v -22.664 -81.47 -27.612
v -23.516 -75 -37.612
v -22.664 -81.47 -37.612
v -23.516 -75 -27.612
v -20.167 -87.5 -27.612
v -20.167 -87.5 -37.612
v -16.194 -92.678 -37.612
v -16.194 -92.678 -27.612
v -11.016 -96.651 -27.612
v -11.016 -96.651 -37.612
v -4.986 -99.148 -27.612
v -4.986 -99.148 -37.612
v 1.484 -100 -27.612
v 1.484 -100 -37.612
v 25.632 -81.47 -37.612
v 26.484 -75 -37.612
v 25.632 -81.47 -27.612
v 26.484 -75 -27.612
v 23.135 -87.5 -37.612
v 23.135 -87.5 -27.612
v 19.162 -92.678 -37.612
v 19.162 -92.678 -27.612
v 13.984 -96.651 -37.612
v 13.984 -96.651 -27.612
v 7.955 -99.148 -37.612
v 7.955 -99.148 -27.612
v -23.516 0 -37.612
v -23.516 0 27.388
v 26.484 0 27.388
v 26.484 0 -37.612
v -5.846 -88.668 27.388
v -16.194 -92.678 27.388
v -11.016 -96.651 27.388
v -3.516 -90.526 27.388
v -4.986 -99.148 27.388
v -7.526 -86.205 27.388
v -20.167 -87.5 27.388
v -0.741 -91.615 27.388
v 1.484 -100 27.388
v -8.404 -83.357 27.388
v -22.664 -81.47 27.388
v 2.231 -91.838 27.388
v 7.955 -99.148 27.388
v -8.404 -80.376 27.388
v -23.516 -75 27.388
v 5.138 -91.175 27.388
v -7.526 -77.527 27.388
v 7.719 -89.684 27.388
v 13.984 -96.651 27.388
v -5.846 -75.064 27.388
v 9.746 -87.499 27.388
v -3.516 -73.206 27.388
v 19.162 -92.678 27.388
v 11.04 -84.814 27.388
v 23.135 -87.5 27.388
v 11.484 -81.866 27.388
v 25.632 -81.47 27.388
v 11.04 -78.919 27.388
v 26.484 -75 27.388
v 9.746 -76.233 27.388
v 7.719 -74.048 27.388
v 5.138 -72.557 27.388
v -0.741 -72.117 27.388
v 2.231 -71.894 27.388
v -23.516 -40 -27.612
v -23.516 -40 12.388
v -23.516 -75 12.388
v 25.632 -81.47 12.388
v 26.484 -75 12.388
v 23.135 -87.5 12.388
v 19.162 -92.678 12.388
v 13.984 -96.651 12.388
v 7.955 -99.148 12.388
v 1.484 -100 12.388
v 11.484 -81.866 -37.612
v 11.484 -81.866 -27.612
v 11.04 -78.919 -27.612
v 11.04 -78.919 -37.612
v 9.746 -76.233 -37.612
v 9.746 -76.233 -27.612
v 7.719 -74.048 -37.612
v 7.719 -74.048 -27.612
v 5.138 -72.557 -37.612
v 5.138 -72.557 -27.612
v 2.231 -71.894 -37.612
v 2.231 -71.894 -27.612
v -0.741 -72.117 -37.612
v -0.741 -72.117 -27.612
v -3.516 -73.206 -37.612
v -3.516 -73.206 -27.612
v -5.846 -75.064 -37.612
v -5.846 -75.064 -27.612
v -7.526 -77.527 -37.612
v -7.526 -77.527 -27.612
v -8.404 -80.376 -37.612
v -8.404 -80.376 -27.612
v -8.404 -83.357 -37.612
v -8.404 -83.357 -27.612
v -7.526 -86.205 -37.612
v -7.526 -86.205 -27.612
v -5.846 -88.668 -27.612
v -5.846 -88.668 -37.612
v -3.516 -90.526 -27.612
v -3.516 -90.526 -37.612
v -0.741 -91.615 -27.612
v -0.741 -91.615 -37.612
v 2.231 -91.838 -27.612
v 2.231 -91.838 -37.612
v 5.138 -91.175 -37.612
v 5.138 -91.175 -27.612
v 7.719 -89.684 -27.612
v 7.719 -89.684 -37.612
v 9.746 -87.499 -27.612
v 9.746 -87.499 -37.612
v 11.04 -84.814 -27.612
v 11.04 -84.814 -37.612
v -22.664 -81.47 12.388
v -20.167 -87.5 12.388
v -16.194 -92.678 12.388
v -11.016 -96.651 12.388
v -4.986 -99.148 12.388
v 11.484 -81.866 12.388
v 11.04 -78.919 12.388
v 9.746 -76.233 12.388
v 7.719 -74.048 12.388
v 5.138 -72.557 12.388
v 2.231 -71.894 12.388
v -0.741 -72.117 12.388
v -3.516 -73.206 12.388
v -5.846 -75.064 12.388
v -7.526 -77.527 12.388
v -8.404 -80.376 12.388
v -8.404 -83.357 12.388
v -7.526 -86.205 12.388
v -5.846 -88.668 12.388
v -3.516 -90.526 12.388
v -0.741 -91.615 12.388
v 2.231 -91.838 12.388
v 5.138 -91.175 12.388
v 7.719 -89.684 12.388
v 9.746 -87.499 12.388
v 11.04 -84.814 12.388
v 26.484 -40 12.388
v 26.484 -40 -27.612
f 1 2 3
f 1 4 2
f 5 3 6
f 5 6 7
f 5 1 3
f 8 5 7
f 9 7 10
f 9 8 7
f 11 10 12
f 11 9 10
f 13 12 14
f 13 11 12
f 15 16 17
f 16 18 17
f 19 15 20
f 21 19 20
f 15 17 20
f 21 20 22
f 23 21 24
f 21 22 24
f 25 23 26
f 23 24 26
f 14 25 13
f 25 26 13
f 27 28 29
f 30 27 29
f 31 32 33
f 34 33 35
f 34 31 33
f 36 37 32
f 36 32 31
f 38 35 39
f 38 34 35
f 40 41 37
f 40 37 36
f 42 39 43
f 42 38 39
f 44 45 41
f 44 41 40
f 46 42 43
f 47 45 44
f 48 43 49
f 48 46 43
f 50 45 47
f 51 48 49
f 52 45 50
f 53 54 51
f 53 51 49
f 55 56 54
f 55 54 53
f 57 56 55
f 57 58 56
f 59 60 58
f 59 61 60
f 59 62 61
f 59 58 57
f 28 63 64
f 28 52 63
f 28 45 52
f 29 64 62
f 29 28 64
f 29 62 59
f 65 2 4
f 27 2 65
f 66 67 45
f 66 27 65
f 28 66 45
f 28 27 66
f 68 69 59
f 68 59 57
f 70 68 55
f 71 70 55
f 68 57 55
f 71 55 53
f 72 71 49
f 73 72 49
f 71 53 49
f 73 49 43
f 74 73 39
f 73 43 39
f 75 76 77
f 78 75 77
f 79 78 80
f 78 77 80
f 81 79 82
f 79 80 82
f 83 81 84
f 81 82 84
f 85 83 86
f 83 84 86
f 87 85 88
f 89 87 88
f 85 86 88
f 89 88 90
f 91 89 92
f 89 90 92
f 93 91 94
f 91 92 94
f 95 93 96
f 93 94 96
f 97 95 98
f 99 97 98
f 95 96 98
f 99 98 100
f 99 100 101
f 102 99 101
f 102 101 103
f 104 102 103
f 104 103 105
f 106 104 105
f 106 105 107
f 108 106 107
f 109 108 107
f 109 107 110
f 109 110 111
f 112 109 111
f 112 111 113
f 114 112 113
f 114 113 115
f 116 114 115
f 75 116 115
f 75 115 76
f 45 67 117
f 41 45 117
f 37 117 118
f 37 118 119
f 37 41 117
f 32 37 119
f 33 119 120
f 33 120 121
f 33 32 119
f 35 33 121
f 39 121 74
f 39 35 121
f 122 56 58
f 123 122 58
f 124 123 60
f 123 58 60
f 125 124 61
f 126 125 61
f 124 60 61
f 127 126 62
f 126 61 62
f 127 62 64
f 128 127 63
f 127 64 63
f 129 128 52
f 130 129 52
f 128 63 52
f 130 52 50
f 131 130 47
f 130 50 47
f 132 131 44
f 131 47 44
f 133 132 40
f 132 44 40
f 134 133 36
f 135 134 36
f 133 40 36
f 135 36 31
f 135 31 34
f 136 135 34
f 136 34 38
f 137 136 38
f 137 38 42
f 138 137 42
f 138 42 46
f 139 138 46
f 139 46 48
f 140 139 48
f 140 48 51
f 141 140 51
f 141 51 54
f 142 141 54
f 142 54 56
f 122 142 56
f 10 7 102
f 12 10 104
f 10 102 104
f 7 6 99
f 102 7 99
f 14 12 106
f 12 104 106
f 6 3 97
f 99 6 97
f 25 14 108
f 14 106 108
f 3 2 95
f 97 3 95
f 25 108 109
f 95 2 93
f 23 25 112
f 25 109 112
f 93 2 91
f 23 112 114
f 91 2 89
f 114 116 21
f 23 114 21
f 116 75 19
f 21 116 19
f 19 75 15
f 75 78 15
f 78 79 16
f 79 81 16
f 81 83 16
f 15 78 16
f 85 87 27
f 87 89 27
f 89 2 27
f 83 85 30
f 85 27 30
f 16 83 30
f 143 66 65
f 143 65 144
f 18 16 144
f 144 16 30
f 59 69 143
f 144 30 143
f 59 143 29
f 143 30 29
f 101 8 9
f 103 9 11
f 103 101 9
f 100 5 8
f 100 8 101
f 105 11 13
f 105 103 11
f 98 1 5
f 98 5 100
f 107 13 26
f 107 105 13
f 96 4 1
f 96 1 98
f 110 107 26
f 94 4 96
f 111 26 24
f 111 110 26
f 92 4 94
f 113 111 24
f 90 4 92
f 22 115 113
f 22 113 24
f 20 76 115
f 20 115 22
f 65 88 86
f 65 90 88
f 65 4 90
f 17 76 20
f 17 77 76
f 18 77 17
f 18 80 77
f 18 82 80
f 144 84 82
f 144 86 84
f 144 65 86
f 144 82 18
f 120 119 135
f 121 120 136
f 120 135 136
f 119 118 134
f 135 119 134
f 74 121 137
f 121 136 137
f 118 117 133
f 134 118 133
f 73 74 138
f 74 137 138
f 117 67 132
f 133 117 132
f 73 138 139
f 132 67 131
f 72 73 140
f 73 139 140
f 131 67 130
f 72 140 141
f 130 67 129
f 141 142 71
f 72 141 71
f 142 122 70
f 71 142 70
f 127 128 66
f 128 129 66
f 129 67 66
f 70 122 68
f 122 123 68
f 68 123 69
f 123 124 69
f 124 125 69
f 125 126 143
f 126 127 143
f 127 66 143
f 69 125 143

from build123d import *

# Parameters (mm, degrees)
F0_W     = 50
F0_H     = 65
F1_DEPTH = 40
F2_W     = 50
F2_H     = 15
F3_DEPTH = 60
F4_W     = 50
F4_H     = 10
F5_DEPTH = 60
F6_R     = 24.99999
F7_R     = 10
F8_DEPTH = 92.4


# Not quite as in the source:
# - a fillet or chamfer is up to 0.001 mm smaller than in the source, because OpenCascade refuses the exact size


with BuildPart() as f1:
    # F0 (on Front) → F1 (new body)
    with BuildSketch(Plane.XZ):
        with Locations((1.4840979129, -5.1116640333)):
            Rectangle(F0_W, F0_H)
    extrude(amount=F1_DEPTH)

    # F2 (on face) → F3 (join)
    with BuildSketch(Plane.XZ.offset(40)):
        with Locations((1.4840979129, 19.8883359667)):
            Rectangle(F2_W, F2_H)
    extrude(amount=F3_DEPTH)

    # F4 (on face) → F5 (join)
    with BuildSketch(Plane.XZ.offset(40)):
        with Locations((1.4840979129, -32.6116640333)):
            Rectangle(F4_W, F4_H)
    extrude(amount=F5_DEPTH)

    # F6 (radius 25 in the source; OpenCascade refuses exactly that, so slightly less here)
    f6_edges = [f1.edges().sort_by_distance(p)[0] for p in [
        (-23.515902, -100, -32.611664),
        (-23.515902, -100, 19.888336),
        (26.484098, -100, 19.888336),
        (26.484098, -100, -32.611664),
    ]]
    fillet(f6_edges, radius=F6_R)

    # F7 (on face) → F8 (cut)
    with BuildSketch(Plane.XY.offset(27.3883359667)):
        with Locations((1.4840979129, -81.8661674857)):
            Circle(F7_R)
    extrude(amount=-F8_DEPTH, mode=Mode.SUBTRACT)


solid = f1.part
